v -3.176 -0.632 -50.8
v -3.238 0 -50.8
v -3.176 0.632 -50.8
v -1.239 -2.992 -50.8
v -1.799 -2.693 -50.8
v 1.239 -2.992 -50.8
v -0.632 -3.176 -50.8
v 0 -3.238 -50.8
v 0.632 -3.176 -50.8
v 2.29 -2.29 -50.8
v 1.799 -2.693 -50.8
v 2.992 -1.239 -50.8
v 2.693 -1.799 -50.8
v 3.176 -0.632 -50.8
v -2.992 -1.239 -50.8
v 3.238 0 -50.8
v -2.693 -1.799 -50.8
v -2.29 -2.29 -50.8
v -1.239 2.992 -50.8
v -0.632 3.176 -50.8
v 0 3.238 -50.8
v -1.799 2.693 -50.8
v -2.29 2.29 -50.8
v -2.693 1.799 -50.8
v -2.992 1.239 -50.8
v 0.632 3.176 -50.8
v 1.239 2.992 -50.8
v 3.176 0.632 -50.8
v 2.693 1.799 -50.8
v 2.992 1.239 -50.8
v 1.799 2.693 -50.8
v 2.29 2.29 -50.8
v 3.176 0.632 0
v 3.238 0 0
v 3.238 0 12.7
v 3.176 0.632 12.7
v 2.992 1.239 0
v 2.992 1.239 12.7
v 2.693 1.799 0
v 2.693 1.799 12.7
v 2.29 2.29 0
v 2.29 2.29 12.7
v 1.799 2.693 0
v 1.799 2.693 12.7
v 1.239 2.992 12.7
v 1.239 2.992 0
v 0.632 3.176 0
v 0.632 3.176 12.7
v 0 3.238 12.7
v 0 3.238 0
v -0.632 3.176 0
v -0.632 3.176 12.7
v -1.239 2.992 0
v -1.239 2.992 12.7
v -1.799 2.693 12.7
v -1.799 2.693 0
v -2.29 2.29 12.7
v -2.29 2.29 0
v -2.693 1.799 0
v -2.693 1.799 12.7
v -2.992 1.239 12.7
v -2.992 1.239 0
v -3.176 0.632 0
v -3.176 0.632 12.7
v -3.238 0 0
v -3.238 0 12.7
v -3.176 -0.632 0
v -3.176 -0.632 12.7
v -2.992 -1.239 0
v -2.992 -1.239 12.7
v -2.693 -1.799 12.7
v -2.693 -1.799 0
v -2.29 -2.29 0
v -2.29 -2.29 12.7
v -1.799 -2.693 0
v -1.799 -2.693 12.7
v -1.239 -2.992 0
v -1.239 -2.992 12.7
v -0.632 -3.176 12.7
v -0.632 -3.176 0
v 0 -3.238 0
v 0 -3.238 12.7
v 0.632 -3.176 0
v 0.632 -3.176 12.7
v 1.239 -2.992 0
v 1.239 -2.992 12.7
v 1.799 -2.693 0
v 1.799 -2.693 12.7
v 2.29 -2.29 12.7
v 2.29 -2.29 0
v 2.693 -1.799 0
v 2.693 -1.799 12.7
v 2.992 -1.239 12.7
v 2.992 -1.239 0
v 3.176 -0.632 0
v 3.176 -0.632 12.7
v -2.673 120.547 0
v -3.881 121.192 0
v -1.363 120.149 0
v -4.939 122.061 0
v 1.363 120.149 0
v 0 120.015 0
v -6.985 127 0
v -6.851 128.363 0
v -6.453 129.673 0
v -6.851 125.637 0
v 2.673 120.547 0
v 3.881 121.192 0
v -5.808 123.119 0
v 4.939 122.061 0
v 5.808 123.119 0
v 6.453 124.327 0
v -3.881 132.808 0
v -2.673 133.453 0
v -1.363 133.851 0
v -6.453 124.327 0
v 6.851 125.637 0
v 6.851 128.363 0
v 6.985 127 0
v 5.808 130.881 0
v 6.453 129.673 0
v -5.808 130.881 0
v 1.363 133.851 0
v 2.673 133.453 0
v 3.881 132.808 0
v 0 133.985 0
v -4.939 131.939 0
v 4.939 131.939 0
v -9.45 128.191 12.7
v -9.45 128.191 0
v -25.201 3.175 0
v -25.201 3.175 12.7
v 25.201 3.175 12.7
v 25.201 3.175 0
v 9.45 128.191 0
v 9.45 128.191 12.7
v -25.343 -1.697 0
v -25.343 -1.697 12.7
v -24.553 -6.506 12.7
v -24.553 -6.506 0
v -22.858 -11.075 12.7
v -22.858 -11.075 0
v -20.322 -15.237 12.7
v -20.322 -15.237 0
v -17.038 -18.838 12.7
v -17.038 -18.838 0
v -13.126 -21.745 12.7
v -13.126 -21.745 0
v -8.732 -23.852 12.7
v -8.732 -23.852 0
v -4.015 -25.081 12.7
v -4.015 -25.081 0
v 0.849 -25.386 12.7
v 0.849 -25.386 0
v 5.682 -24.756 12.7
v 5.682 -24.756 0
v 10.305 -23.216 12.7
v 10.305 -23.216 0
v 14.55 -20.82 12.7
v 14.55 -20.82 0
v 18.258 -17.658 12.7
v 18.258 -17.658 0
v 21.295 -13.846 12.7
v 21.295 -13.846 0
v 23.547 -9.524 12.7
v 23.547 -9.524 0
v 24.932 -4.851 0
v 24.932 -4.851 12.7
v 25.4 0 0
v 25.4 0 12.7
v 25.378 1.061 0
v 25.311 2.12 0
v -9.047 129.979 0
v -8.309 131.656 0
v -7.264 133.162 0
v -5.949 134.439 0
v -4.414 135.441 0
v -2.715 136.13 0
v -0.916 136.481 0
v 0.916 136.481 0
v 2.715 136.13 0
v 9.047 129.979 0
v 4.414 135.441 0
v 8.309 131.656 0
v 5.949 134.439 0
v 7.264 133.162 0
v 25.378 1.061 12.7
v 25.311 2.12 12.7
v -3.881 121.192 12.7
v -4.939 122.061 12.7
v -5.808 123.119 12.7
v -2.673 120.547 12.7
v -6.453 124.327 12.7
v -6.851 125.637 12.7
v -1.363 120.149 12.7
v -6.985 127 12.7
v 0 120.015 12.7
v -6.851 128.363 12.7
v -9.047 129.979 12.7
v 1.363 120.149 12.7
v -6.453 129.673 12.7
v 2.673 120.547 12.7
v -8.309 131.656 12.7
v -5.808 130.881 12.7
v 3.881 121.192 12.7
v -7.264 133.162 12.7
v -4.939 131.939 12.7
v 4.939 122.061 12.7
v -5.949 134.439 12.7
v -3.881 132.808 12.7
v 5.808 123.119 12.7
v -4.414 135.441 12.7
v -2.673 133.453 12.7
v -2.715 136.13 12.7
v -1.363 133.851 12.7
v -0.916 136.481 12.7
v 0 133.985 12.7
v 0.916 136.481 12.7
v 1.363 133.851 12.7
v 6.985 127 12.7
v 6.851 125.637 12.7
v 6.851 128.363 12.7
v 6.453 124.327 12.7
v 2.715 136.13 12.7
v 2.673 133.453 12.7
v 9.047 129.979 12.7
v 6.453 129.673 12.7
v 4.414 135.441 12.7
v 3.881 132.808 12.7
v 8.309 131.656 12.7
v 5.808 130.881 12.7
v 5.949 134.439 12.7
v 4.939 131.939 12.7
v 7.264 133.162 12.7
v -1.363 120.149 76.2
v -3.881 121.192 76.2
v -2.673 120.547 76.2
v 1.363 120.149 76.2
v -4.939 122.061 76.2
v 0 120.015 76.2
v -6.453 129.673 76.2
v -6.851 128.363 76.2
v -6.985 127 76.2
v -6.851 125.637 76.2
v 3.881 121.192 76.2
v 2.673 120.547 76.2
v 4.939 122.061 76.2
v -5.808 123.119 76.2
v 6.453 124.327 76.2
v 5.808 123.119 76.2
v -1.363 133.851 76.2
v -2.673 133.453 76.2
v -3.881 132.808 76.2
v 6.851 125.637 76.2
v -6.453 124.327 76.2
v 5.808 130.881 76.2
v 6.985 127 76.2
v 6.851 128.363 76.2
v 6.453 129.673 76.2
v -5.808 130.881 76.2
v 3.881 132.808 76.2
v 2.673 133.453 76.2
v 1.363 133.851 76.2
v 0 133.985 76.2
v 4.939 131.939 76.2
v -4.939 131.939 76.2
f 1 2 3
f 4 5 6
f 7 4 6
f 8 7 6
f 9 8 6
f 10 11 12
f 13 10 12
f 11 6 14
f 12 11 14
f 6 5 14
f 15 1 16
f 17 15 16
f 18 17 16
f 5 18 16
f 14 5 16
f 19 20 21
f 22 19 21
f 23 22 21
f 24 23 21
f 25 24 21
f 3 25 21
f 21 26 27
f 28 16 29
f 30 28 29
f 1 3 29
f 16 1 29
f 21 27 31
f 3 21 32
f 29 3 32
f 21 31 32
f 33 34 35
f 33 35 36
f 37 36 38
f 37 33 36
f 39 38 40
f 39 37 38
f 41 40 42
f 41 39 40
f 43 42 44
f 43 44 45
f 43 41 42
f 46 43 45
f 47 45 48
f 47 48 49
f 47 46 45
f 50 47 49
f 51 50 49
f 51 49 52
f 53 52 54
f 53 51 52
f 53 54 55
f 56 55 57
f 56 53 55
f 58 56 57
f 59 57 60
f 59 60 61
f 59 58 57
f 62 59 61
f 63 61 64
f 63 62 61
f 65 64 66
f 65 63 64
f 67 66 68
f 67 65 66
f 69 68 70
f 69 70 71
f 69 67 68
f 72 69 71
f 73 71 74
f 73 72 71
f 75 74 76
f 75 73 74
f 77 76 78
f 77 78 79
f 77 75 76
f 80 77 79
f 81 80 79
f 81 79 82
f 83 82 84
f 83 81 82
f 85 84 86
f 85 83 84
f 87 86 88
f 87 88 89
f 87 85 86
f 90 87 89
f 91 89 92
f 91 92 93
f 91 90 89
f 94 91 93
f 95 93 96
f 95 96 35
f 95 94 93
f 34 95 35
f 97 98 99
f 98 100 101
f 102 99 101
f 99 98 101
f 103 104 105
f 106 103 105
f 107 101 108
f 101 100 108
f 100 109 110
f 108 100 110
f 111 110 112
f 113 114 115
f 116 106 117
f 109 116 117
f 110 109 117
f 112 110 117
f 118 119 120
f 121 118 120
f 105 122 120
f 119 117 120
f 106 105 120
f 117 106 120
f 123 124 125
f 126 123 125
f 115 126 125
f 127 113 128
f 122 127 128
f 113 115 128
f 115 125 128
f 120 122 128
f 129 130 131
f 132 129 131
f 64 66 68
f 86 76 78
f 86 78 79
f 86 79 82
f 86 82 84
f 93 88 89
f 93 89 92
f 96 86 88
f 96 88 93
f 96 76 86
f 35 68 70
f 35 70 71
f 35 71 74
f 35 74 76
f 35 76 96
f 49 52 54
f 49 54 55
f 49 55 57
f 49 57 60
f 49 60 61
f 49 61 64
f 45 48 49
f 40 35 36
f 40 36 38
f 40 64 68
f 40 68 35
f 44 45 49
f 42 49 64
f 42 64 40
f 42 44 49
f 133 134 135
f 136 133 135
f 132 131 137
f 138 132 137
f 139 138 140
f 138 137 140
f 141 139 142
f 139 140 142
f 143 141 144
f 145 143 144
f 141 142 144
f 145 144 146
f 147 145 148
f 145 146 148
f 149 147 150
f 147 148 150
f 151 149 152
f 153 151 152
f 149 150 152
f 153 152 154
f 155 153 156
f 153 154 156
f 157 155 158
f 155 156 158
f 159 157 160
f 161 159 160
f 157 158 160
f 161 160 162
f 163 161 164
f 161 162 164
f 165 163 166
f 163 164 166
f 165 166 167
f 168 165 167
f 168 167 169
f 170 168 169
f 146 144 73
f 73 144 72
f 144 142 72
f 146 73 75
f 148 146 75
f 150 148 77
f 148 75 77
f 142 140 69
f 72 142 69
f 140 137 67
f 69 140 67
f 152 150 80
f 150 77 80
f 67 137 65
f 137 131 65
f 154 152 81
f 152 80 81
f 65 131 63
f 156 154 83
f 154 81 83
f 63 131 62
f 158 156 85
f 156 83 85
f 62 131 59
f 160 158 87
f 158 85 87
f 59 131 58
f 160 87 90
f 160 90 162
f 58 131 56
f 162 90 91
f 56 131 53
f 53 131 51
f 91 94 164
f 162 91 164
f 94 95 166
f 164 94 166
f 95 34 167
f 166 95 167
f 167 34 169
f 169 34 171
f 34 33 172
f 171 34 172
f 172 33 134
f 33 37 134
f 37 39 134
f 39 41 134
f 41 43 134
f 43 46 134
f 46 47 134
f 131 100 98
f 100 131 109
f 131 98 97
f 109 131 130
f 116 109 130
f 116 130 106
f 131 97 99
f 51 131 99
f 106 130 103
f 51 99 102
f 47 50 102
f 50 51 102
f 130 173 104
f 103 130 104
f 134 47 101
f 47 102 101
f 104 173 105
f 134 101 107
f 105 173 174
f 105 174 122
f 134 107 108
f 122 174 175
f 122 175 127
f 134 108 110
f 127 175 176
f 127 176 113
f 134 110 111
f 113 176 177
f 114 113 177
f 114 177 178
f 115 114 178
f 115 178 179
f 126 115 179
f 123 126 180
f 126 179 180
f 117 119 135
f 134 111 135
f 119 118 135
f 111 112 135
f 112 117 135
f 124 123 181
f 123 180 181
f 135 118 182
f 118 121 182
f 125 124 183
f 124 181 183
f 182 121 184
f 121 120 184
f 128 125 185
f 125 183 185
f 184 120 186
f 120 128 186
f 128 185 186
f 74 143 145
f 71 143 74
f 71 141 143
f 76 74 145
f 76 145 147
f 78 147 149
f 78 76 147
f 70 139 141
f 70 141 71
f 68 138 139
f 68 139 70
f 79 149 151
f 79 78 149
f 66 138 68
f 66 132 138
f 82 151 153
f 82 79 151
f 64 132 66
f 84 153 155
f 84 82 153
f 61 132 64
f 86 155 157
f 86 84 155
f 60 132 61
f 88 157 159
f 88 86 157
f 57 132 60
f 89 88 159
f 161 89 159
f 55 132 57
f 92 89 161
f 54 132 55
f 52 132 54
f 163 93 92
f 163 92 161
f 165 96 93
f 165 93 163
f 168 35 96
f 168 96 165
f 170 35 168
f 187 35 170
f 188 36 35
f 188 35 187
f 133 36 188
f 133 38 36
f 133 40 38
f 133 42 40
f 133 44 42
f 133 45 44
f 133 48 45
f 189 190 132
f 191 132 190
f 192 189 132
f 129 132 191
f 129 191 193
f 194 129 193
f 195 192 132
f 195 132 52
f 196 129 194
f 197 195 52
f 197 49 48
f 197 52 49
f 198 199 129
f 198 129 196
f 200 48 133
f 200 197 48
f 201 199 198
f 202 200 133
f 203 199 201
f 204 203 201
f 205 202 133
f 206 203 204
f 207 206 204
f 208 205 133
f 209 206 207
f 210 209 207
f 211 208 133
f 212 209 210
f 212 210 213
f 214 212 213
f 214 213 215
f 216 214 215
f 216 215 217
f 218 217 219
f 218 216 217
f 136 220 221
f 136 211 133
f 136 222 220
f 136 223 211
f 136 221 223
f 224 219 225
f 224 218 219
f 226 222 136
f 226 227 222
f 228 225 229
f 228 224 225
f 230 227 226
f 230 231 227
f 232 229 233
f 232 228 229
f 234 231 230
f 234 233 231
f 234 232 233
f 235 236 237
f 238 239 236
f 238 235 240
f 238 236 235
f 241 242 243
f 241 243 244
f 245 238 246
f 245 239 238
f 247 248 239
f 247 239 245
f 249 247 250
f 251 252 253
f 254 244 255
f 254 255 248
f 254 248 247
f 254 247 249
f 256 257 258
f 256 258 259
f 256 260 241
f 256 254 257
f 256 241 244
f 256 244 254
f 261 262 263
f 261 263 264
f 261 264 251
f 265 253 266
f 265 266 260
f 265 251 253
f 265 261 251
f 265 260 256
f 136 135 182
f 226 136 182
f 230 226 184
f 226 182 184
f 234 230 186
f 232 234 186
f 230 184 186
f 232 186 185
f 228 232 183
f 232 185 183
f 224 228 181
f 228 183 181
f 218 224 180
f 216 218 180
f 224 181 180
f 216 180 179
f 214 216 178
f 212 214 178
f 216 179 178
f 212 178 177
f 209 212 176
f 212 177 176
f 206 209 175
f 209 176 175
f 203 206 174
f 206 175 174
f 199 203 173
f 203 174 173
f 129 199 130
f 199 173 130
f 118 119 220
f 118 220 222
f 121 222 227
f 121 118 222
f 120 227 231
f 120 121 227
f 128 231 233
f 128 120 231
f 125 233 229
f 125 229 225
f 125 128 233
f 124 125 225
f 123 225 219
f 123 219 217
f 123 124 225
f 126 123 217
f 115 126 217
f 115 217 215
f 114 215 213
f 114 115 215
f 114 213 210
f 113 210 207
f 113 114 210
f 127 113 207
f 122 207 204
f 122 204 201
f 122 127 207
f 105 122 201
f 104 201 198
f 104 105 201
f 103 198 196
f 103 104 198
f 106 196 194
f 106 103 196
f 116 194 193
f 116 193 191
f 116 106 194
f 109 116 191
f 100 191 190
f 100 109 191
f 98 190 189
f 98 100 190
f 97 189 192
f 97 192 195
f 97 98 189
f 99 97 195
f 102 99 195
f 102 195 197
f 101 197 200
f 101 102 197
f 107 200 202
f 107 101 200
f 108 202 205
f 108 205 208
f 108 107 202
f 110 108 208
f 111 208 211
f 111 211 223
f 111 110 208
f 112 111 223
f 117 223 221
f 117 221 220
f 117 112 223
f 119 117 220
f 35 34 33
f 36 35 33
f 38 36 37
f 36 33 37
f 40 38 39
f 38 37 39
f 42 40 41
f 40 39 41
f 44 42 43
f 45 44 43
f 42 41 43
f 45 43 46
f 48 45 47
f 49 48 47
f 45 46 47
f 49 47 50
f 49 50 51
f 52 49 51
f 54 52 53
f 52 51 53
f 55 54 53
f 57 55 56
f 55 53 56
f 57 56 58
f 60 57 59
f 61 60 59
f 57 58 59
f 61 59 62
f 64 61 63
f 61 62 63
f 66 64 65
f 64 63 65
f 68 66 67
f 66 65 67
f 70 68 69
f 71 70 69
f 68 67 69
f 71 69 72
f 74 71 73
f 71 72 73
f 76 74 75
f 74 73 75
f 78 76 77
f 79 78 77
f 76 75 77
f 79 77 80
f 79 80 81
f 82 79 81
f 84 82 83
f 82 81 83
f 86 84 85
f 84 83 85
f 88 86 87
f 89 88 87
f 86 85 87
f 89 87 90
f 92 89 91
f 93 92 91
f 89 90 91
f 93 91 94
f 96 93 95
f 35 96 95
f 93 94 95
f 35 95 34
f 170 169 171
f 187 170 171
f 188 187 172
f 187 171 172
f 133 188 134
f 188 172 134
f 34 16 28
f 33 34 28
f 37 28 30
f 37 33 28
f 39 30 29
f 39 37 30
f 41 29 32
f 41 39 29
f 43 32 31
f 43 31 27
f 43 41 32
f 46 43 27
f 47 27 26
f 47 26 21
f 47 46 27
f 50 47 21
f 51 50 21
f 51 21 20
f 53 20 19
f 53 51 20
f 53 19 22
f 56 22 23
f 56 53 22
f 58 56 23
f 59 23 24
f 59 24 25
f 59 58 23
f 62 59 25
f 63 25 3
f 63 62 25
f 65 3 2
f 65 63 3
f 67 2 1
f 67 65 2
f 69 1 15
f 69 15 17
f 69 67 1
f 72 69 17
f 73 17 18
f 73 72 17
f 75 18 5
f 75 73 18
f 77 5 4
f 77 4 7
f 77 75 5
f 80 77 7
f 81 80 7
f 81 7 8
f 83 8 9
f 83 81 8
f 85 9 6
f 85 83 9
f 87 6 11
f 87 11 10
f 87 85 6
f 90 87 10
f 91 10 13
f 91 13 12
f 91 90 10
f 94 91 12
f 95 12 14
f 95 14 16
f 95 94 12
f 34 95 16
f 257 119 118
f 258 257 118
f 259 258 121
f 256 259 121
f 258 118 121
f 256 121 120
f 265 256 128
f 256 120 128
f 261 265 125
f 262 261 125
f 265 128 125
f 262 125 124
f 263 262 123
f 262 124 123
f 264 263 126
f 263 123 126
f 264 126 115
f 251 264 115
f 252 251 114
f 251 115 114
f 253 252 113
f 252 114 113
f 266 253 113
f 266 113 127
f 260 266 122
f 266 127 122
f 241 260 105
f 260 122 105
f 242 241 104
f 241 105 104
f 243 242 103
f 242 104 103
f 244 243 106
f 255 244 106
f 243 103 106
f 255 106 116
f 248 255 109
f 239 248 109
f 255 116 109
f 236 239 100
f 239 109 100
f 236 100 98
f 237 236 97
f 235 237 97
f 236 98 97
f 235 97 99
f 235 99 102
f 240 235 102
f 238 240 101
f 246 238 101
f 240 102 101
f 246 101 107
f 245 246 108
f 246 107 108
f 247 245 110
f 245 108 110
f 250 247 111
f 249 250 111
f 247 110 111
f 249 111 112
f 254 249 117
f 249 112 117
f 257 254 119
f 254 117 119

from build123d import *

# Parameters (mm, degrees)
F0_R     = 6.985
F1_DEPTH = 76.2
F0_R_2   = 3.2385
F2_DEPTH = 50.8
F3_DEPTH = 12.7
F4_DEPTH = 12.7


with BuildPart() as f1:
    # F0 (on Top) → F1 (new body)
    with BuildSketch(Plane.XY):
        with Locations((0, 127)):
            Circle(F0_R)
    extrude(amount=F1_DEPTH)


with BuildPart() as f2:
    # F0 (on Top) → F2 (new body)
    with BuildSketch(Plane.XY):
        Circle(F0_R_2)
    extrude(amount=-F2_DEPTH)

    # F3 (add): faces of the model
    f3_faces = [f2.faces().sort_by_distance(p)[0] for p in [
        (0, 0, 0),
        (0, 0, 0),
    ]]
    extrude(f3_faces, amount=F3_DEPTH)


with BuildPart() as f4:
    # F0 (on Top) → F4 (new body)
    with BuildSketch(Plane.XY):
        with BuildLine():
            ThreePointArc((-25.2007812379, 3.175), (-1.5906219786, -25.3501463846), (25.4, 0))
            ThreePointArc((25.4, 0), (25.3501463846, 1.5906219786), (25.2007812379, 3.175))
            ThreePointArc((25.2007812379, 3.175), (0, 25.4), (-25.2007812379, 3.175))
        make_face()
        Circle(F0_R_2, mode=Mode.SUBTRACT)
        with BuildLine():
            ThreePointArc((-25.2007812379, 3.175), (0, 25.4), (25.2007812379, 3.175))
            Line((25.2007812379, 3.175), (9.4502929642, 128.190625))
            ThreePointArc((9.4502929642, 128.190625), (9.5063048942, 127.596483242), (9.525, 127))
            ThreePointArc((9.525, 127), (-0.596483242, 117.4936951058), (-9.4502929642, 128.190625))
            Line((-9.4502929642, 128.190625), (-25.2007812379, 3.175))
        make_face()
        with BuildLine():
            ThreePointArc((9.525, 127), (9.5063048942, 127.596483242), (9.4502929642, 128.190625))
            ThreePointArc((9.4502929642, 128.190625), (0, 136.525), (-9.4502929642, 128.190625))
            ThreePointArc((-9.4502929642, 128.190625), (-0.596483242, 117.4936951058), (9.525, 127))
        make_face()
        with Locations((0, 127)):
            Circle(F0_R, mode=Mode.SUBTRACT)
    extrude(amount=F4_DEPTH)


solid = Compound([f1.part, f2.part, f4.part])
